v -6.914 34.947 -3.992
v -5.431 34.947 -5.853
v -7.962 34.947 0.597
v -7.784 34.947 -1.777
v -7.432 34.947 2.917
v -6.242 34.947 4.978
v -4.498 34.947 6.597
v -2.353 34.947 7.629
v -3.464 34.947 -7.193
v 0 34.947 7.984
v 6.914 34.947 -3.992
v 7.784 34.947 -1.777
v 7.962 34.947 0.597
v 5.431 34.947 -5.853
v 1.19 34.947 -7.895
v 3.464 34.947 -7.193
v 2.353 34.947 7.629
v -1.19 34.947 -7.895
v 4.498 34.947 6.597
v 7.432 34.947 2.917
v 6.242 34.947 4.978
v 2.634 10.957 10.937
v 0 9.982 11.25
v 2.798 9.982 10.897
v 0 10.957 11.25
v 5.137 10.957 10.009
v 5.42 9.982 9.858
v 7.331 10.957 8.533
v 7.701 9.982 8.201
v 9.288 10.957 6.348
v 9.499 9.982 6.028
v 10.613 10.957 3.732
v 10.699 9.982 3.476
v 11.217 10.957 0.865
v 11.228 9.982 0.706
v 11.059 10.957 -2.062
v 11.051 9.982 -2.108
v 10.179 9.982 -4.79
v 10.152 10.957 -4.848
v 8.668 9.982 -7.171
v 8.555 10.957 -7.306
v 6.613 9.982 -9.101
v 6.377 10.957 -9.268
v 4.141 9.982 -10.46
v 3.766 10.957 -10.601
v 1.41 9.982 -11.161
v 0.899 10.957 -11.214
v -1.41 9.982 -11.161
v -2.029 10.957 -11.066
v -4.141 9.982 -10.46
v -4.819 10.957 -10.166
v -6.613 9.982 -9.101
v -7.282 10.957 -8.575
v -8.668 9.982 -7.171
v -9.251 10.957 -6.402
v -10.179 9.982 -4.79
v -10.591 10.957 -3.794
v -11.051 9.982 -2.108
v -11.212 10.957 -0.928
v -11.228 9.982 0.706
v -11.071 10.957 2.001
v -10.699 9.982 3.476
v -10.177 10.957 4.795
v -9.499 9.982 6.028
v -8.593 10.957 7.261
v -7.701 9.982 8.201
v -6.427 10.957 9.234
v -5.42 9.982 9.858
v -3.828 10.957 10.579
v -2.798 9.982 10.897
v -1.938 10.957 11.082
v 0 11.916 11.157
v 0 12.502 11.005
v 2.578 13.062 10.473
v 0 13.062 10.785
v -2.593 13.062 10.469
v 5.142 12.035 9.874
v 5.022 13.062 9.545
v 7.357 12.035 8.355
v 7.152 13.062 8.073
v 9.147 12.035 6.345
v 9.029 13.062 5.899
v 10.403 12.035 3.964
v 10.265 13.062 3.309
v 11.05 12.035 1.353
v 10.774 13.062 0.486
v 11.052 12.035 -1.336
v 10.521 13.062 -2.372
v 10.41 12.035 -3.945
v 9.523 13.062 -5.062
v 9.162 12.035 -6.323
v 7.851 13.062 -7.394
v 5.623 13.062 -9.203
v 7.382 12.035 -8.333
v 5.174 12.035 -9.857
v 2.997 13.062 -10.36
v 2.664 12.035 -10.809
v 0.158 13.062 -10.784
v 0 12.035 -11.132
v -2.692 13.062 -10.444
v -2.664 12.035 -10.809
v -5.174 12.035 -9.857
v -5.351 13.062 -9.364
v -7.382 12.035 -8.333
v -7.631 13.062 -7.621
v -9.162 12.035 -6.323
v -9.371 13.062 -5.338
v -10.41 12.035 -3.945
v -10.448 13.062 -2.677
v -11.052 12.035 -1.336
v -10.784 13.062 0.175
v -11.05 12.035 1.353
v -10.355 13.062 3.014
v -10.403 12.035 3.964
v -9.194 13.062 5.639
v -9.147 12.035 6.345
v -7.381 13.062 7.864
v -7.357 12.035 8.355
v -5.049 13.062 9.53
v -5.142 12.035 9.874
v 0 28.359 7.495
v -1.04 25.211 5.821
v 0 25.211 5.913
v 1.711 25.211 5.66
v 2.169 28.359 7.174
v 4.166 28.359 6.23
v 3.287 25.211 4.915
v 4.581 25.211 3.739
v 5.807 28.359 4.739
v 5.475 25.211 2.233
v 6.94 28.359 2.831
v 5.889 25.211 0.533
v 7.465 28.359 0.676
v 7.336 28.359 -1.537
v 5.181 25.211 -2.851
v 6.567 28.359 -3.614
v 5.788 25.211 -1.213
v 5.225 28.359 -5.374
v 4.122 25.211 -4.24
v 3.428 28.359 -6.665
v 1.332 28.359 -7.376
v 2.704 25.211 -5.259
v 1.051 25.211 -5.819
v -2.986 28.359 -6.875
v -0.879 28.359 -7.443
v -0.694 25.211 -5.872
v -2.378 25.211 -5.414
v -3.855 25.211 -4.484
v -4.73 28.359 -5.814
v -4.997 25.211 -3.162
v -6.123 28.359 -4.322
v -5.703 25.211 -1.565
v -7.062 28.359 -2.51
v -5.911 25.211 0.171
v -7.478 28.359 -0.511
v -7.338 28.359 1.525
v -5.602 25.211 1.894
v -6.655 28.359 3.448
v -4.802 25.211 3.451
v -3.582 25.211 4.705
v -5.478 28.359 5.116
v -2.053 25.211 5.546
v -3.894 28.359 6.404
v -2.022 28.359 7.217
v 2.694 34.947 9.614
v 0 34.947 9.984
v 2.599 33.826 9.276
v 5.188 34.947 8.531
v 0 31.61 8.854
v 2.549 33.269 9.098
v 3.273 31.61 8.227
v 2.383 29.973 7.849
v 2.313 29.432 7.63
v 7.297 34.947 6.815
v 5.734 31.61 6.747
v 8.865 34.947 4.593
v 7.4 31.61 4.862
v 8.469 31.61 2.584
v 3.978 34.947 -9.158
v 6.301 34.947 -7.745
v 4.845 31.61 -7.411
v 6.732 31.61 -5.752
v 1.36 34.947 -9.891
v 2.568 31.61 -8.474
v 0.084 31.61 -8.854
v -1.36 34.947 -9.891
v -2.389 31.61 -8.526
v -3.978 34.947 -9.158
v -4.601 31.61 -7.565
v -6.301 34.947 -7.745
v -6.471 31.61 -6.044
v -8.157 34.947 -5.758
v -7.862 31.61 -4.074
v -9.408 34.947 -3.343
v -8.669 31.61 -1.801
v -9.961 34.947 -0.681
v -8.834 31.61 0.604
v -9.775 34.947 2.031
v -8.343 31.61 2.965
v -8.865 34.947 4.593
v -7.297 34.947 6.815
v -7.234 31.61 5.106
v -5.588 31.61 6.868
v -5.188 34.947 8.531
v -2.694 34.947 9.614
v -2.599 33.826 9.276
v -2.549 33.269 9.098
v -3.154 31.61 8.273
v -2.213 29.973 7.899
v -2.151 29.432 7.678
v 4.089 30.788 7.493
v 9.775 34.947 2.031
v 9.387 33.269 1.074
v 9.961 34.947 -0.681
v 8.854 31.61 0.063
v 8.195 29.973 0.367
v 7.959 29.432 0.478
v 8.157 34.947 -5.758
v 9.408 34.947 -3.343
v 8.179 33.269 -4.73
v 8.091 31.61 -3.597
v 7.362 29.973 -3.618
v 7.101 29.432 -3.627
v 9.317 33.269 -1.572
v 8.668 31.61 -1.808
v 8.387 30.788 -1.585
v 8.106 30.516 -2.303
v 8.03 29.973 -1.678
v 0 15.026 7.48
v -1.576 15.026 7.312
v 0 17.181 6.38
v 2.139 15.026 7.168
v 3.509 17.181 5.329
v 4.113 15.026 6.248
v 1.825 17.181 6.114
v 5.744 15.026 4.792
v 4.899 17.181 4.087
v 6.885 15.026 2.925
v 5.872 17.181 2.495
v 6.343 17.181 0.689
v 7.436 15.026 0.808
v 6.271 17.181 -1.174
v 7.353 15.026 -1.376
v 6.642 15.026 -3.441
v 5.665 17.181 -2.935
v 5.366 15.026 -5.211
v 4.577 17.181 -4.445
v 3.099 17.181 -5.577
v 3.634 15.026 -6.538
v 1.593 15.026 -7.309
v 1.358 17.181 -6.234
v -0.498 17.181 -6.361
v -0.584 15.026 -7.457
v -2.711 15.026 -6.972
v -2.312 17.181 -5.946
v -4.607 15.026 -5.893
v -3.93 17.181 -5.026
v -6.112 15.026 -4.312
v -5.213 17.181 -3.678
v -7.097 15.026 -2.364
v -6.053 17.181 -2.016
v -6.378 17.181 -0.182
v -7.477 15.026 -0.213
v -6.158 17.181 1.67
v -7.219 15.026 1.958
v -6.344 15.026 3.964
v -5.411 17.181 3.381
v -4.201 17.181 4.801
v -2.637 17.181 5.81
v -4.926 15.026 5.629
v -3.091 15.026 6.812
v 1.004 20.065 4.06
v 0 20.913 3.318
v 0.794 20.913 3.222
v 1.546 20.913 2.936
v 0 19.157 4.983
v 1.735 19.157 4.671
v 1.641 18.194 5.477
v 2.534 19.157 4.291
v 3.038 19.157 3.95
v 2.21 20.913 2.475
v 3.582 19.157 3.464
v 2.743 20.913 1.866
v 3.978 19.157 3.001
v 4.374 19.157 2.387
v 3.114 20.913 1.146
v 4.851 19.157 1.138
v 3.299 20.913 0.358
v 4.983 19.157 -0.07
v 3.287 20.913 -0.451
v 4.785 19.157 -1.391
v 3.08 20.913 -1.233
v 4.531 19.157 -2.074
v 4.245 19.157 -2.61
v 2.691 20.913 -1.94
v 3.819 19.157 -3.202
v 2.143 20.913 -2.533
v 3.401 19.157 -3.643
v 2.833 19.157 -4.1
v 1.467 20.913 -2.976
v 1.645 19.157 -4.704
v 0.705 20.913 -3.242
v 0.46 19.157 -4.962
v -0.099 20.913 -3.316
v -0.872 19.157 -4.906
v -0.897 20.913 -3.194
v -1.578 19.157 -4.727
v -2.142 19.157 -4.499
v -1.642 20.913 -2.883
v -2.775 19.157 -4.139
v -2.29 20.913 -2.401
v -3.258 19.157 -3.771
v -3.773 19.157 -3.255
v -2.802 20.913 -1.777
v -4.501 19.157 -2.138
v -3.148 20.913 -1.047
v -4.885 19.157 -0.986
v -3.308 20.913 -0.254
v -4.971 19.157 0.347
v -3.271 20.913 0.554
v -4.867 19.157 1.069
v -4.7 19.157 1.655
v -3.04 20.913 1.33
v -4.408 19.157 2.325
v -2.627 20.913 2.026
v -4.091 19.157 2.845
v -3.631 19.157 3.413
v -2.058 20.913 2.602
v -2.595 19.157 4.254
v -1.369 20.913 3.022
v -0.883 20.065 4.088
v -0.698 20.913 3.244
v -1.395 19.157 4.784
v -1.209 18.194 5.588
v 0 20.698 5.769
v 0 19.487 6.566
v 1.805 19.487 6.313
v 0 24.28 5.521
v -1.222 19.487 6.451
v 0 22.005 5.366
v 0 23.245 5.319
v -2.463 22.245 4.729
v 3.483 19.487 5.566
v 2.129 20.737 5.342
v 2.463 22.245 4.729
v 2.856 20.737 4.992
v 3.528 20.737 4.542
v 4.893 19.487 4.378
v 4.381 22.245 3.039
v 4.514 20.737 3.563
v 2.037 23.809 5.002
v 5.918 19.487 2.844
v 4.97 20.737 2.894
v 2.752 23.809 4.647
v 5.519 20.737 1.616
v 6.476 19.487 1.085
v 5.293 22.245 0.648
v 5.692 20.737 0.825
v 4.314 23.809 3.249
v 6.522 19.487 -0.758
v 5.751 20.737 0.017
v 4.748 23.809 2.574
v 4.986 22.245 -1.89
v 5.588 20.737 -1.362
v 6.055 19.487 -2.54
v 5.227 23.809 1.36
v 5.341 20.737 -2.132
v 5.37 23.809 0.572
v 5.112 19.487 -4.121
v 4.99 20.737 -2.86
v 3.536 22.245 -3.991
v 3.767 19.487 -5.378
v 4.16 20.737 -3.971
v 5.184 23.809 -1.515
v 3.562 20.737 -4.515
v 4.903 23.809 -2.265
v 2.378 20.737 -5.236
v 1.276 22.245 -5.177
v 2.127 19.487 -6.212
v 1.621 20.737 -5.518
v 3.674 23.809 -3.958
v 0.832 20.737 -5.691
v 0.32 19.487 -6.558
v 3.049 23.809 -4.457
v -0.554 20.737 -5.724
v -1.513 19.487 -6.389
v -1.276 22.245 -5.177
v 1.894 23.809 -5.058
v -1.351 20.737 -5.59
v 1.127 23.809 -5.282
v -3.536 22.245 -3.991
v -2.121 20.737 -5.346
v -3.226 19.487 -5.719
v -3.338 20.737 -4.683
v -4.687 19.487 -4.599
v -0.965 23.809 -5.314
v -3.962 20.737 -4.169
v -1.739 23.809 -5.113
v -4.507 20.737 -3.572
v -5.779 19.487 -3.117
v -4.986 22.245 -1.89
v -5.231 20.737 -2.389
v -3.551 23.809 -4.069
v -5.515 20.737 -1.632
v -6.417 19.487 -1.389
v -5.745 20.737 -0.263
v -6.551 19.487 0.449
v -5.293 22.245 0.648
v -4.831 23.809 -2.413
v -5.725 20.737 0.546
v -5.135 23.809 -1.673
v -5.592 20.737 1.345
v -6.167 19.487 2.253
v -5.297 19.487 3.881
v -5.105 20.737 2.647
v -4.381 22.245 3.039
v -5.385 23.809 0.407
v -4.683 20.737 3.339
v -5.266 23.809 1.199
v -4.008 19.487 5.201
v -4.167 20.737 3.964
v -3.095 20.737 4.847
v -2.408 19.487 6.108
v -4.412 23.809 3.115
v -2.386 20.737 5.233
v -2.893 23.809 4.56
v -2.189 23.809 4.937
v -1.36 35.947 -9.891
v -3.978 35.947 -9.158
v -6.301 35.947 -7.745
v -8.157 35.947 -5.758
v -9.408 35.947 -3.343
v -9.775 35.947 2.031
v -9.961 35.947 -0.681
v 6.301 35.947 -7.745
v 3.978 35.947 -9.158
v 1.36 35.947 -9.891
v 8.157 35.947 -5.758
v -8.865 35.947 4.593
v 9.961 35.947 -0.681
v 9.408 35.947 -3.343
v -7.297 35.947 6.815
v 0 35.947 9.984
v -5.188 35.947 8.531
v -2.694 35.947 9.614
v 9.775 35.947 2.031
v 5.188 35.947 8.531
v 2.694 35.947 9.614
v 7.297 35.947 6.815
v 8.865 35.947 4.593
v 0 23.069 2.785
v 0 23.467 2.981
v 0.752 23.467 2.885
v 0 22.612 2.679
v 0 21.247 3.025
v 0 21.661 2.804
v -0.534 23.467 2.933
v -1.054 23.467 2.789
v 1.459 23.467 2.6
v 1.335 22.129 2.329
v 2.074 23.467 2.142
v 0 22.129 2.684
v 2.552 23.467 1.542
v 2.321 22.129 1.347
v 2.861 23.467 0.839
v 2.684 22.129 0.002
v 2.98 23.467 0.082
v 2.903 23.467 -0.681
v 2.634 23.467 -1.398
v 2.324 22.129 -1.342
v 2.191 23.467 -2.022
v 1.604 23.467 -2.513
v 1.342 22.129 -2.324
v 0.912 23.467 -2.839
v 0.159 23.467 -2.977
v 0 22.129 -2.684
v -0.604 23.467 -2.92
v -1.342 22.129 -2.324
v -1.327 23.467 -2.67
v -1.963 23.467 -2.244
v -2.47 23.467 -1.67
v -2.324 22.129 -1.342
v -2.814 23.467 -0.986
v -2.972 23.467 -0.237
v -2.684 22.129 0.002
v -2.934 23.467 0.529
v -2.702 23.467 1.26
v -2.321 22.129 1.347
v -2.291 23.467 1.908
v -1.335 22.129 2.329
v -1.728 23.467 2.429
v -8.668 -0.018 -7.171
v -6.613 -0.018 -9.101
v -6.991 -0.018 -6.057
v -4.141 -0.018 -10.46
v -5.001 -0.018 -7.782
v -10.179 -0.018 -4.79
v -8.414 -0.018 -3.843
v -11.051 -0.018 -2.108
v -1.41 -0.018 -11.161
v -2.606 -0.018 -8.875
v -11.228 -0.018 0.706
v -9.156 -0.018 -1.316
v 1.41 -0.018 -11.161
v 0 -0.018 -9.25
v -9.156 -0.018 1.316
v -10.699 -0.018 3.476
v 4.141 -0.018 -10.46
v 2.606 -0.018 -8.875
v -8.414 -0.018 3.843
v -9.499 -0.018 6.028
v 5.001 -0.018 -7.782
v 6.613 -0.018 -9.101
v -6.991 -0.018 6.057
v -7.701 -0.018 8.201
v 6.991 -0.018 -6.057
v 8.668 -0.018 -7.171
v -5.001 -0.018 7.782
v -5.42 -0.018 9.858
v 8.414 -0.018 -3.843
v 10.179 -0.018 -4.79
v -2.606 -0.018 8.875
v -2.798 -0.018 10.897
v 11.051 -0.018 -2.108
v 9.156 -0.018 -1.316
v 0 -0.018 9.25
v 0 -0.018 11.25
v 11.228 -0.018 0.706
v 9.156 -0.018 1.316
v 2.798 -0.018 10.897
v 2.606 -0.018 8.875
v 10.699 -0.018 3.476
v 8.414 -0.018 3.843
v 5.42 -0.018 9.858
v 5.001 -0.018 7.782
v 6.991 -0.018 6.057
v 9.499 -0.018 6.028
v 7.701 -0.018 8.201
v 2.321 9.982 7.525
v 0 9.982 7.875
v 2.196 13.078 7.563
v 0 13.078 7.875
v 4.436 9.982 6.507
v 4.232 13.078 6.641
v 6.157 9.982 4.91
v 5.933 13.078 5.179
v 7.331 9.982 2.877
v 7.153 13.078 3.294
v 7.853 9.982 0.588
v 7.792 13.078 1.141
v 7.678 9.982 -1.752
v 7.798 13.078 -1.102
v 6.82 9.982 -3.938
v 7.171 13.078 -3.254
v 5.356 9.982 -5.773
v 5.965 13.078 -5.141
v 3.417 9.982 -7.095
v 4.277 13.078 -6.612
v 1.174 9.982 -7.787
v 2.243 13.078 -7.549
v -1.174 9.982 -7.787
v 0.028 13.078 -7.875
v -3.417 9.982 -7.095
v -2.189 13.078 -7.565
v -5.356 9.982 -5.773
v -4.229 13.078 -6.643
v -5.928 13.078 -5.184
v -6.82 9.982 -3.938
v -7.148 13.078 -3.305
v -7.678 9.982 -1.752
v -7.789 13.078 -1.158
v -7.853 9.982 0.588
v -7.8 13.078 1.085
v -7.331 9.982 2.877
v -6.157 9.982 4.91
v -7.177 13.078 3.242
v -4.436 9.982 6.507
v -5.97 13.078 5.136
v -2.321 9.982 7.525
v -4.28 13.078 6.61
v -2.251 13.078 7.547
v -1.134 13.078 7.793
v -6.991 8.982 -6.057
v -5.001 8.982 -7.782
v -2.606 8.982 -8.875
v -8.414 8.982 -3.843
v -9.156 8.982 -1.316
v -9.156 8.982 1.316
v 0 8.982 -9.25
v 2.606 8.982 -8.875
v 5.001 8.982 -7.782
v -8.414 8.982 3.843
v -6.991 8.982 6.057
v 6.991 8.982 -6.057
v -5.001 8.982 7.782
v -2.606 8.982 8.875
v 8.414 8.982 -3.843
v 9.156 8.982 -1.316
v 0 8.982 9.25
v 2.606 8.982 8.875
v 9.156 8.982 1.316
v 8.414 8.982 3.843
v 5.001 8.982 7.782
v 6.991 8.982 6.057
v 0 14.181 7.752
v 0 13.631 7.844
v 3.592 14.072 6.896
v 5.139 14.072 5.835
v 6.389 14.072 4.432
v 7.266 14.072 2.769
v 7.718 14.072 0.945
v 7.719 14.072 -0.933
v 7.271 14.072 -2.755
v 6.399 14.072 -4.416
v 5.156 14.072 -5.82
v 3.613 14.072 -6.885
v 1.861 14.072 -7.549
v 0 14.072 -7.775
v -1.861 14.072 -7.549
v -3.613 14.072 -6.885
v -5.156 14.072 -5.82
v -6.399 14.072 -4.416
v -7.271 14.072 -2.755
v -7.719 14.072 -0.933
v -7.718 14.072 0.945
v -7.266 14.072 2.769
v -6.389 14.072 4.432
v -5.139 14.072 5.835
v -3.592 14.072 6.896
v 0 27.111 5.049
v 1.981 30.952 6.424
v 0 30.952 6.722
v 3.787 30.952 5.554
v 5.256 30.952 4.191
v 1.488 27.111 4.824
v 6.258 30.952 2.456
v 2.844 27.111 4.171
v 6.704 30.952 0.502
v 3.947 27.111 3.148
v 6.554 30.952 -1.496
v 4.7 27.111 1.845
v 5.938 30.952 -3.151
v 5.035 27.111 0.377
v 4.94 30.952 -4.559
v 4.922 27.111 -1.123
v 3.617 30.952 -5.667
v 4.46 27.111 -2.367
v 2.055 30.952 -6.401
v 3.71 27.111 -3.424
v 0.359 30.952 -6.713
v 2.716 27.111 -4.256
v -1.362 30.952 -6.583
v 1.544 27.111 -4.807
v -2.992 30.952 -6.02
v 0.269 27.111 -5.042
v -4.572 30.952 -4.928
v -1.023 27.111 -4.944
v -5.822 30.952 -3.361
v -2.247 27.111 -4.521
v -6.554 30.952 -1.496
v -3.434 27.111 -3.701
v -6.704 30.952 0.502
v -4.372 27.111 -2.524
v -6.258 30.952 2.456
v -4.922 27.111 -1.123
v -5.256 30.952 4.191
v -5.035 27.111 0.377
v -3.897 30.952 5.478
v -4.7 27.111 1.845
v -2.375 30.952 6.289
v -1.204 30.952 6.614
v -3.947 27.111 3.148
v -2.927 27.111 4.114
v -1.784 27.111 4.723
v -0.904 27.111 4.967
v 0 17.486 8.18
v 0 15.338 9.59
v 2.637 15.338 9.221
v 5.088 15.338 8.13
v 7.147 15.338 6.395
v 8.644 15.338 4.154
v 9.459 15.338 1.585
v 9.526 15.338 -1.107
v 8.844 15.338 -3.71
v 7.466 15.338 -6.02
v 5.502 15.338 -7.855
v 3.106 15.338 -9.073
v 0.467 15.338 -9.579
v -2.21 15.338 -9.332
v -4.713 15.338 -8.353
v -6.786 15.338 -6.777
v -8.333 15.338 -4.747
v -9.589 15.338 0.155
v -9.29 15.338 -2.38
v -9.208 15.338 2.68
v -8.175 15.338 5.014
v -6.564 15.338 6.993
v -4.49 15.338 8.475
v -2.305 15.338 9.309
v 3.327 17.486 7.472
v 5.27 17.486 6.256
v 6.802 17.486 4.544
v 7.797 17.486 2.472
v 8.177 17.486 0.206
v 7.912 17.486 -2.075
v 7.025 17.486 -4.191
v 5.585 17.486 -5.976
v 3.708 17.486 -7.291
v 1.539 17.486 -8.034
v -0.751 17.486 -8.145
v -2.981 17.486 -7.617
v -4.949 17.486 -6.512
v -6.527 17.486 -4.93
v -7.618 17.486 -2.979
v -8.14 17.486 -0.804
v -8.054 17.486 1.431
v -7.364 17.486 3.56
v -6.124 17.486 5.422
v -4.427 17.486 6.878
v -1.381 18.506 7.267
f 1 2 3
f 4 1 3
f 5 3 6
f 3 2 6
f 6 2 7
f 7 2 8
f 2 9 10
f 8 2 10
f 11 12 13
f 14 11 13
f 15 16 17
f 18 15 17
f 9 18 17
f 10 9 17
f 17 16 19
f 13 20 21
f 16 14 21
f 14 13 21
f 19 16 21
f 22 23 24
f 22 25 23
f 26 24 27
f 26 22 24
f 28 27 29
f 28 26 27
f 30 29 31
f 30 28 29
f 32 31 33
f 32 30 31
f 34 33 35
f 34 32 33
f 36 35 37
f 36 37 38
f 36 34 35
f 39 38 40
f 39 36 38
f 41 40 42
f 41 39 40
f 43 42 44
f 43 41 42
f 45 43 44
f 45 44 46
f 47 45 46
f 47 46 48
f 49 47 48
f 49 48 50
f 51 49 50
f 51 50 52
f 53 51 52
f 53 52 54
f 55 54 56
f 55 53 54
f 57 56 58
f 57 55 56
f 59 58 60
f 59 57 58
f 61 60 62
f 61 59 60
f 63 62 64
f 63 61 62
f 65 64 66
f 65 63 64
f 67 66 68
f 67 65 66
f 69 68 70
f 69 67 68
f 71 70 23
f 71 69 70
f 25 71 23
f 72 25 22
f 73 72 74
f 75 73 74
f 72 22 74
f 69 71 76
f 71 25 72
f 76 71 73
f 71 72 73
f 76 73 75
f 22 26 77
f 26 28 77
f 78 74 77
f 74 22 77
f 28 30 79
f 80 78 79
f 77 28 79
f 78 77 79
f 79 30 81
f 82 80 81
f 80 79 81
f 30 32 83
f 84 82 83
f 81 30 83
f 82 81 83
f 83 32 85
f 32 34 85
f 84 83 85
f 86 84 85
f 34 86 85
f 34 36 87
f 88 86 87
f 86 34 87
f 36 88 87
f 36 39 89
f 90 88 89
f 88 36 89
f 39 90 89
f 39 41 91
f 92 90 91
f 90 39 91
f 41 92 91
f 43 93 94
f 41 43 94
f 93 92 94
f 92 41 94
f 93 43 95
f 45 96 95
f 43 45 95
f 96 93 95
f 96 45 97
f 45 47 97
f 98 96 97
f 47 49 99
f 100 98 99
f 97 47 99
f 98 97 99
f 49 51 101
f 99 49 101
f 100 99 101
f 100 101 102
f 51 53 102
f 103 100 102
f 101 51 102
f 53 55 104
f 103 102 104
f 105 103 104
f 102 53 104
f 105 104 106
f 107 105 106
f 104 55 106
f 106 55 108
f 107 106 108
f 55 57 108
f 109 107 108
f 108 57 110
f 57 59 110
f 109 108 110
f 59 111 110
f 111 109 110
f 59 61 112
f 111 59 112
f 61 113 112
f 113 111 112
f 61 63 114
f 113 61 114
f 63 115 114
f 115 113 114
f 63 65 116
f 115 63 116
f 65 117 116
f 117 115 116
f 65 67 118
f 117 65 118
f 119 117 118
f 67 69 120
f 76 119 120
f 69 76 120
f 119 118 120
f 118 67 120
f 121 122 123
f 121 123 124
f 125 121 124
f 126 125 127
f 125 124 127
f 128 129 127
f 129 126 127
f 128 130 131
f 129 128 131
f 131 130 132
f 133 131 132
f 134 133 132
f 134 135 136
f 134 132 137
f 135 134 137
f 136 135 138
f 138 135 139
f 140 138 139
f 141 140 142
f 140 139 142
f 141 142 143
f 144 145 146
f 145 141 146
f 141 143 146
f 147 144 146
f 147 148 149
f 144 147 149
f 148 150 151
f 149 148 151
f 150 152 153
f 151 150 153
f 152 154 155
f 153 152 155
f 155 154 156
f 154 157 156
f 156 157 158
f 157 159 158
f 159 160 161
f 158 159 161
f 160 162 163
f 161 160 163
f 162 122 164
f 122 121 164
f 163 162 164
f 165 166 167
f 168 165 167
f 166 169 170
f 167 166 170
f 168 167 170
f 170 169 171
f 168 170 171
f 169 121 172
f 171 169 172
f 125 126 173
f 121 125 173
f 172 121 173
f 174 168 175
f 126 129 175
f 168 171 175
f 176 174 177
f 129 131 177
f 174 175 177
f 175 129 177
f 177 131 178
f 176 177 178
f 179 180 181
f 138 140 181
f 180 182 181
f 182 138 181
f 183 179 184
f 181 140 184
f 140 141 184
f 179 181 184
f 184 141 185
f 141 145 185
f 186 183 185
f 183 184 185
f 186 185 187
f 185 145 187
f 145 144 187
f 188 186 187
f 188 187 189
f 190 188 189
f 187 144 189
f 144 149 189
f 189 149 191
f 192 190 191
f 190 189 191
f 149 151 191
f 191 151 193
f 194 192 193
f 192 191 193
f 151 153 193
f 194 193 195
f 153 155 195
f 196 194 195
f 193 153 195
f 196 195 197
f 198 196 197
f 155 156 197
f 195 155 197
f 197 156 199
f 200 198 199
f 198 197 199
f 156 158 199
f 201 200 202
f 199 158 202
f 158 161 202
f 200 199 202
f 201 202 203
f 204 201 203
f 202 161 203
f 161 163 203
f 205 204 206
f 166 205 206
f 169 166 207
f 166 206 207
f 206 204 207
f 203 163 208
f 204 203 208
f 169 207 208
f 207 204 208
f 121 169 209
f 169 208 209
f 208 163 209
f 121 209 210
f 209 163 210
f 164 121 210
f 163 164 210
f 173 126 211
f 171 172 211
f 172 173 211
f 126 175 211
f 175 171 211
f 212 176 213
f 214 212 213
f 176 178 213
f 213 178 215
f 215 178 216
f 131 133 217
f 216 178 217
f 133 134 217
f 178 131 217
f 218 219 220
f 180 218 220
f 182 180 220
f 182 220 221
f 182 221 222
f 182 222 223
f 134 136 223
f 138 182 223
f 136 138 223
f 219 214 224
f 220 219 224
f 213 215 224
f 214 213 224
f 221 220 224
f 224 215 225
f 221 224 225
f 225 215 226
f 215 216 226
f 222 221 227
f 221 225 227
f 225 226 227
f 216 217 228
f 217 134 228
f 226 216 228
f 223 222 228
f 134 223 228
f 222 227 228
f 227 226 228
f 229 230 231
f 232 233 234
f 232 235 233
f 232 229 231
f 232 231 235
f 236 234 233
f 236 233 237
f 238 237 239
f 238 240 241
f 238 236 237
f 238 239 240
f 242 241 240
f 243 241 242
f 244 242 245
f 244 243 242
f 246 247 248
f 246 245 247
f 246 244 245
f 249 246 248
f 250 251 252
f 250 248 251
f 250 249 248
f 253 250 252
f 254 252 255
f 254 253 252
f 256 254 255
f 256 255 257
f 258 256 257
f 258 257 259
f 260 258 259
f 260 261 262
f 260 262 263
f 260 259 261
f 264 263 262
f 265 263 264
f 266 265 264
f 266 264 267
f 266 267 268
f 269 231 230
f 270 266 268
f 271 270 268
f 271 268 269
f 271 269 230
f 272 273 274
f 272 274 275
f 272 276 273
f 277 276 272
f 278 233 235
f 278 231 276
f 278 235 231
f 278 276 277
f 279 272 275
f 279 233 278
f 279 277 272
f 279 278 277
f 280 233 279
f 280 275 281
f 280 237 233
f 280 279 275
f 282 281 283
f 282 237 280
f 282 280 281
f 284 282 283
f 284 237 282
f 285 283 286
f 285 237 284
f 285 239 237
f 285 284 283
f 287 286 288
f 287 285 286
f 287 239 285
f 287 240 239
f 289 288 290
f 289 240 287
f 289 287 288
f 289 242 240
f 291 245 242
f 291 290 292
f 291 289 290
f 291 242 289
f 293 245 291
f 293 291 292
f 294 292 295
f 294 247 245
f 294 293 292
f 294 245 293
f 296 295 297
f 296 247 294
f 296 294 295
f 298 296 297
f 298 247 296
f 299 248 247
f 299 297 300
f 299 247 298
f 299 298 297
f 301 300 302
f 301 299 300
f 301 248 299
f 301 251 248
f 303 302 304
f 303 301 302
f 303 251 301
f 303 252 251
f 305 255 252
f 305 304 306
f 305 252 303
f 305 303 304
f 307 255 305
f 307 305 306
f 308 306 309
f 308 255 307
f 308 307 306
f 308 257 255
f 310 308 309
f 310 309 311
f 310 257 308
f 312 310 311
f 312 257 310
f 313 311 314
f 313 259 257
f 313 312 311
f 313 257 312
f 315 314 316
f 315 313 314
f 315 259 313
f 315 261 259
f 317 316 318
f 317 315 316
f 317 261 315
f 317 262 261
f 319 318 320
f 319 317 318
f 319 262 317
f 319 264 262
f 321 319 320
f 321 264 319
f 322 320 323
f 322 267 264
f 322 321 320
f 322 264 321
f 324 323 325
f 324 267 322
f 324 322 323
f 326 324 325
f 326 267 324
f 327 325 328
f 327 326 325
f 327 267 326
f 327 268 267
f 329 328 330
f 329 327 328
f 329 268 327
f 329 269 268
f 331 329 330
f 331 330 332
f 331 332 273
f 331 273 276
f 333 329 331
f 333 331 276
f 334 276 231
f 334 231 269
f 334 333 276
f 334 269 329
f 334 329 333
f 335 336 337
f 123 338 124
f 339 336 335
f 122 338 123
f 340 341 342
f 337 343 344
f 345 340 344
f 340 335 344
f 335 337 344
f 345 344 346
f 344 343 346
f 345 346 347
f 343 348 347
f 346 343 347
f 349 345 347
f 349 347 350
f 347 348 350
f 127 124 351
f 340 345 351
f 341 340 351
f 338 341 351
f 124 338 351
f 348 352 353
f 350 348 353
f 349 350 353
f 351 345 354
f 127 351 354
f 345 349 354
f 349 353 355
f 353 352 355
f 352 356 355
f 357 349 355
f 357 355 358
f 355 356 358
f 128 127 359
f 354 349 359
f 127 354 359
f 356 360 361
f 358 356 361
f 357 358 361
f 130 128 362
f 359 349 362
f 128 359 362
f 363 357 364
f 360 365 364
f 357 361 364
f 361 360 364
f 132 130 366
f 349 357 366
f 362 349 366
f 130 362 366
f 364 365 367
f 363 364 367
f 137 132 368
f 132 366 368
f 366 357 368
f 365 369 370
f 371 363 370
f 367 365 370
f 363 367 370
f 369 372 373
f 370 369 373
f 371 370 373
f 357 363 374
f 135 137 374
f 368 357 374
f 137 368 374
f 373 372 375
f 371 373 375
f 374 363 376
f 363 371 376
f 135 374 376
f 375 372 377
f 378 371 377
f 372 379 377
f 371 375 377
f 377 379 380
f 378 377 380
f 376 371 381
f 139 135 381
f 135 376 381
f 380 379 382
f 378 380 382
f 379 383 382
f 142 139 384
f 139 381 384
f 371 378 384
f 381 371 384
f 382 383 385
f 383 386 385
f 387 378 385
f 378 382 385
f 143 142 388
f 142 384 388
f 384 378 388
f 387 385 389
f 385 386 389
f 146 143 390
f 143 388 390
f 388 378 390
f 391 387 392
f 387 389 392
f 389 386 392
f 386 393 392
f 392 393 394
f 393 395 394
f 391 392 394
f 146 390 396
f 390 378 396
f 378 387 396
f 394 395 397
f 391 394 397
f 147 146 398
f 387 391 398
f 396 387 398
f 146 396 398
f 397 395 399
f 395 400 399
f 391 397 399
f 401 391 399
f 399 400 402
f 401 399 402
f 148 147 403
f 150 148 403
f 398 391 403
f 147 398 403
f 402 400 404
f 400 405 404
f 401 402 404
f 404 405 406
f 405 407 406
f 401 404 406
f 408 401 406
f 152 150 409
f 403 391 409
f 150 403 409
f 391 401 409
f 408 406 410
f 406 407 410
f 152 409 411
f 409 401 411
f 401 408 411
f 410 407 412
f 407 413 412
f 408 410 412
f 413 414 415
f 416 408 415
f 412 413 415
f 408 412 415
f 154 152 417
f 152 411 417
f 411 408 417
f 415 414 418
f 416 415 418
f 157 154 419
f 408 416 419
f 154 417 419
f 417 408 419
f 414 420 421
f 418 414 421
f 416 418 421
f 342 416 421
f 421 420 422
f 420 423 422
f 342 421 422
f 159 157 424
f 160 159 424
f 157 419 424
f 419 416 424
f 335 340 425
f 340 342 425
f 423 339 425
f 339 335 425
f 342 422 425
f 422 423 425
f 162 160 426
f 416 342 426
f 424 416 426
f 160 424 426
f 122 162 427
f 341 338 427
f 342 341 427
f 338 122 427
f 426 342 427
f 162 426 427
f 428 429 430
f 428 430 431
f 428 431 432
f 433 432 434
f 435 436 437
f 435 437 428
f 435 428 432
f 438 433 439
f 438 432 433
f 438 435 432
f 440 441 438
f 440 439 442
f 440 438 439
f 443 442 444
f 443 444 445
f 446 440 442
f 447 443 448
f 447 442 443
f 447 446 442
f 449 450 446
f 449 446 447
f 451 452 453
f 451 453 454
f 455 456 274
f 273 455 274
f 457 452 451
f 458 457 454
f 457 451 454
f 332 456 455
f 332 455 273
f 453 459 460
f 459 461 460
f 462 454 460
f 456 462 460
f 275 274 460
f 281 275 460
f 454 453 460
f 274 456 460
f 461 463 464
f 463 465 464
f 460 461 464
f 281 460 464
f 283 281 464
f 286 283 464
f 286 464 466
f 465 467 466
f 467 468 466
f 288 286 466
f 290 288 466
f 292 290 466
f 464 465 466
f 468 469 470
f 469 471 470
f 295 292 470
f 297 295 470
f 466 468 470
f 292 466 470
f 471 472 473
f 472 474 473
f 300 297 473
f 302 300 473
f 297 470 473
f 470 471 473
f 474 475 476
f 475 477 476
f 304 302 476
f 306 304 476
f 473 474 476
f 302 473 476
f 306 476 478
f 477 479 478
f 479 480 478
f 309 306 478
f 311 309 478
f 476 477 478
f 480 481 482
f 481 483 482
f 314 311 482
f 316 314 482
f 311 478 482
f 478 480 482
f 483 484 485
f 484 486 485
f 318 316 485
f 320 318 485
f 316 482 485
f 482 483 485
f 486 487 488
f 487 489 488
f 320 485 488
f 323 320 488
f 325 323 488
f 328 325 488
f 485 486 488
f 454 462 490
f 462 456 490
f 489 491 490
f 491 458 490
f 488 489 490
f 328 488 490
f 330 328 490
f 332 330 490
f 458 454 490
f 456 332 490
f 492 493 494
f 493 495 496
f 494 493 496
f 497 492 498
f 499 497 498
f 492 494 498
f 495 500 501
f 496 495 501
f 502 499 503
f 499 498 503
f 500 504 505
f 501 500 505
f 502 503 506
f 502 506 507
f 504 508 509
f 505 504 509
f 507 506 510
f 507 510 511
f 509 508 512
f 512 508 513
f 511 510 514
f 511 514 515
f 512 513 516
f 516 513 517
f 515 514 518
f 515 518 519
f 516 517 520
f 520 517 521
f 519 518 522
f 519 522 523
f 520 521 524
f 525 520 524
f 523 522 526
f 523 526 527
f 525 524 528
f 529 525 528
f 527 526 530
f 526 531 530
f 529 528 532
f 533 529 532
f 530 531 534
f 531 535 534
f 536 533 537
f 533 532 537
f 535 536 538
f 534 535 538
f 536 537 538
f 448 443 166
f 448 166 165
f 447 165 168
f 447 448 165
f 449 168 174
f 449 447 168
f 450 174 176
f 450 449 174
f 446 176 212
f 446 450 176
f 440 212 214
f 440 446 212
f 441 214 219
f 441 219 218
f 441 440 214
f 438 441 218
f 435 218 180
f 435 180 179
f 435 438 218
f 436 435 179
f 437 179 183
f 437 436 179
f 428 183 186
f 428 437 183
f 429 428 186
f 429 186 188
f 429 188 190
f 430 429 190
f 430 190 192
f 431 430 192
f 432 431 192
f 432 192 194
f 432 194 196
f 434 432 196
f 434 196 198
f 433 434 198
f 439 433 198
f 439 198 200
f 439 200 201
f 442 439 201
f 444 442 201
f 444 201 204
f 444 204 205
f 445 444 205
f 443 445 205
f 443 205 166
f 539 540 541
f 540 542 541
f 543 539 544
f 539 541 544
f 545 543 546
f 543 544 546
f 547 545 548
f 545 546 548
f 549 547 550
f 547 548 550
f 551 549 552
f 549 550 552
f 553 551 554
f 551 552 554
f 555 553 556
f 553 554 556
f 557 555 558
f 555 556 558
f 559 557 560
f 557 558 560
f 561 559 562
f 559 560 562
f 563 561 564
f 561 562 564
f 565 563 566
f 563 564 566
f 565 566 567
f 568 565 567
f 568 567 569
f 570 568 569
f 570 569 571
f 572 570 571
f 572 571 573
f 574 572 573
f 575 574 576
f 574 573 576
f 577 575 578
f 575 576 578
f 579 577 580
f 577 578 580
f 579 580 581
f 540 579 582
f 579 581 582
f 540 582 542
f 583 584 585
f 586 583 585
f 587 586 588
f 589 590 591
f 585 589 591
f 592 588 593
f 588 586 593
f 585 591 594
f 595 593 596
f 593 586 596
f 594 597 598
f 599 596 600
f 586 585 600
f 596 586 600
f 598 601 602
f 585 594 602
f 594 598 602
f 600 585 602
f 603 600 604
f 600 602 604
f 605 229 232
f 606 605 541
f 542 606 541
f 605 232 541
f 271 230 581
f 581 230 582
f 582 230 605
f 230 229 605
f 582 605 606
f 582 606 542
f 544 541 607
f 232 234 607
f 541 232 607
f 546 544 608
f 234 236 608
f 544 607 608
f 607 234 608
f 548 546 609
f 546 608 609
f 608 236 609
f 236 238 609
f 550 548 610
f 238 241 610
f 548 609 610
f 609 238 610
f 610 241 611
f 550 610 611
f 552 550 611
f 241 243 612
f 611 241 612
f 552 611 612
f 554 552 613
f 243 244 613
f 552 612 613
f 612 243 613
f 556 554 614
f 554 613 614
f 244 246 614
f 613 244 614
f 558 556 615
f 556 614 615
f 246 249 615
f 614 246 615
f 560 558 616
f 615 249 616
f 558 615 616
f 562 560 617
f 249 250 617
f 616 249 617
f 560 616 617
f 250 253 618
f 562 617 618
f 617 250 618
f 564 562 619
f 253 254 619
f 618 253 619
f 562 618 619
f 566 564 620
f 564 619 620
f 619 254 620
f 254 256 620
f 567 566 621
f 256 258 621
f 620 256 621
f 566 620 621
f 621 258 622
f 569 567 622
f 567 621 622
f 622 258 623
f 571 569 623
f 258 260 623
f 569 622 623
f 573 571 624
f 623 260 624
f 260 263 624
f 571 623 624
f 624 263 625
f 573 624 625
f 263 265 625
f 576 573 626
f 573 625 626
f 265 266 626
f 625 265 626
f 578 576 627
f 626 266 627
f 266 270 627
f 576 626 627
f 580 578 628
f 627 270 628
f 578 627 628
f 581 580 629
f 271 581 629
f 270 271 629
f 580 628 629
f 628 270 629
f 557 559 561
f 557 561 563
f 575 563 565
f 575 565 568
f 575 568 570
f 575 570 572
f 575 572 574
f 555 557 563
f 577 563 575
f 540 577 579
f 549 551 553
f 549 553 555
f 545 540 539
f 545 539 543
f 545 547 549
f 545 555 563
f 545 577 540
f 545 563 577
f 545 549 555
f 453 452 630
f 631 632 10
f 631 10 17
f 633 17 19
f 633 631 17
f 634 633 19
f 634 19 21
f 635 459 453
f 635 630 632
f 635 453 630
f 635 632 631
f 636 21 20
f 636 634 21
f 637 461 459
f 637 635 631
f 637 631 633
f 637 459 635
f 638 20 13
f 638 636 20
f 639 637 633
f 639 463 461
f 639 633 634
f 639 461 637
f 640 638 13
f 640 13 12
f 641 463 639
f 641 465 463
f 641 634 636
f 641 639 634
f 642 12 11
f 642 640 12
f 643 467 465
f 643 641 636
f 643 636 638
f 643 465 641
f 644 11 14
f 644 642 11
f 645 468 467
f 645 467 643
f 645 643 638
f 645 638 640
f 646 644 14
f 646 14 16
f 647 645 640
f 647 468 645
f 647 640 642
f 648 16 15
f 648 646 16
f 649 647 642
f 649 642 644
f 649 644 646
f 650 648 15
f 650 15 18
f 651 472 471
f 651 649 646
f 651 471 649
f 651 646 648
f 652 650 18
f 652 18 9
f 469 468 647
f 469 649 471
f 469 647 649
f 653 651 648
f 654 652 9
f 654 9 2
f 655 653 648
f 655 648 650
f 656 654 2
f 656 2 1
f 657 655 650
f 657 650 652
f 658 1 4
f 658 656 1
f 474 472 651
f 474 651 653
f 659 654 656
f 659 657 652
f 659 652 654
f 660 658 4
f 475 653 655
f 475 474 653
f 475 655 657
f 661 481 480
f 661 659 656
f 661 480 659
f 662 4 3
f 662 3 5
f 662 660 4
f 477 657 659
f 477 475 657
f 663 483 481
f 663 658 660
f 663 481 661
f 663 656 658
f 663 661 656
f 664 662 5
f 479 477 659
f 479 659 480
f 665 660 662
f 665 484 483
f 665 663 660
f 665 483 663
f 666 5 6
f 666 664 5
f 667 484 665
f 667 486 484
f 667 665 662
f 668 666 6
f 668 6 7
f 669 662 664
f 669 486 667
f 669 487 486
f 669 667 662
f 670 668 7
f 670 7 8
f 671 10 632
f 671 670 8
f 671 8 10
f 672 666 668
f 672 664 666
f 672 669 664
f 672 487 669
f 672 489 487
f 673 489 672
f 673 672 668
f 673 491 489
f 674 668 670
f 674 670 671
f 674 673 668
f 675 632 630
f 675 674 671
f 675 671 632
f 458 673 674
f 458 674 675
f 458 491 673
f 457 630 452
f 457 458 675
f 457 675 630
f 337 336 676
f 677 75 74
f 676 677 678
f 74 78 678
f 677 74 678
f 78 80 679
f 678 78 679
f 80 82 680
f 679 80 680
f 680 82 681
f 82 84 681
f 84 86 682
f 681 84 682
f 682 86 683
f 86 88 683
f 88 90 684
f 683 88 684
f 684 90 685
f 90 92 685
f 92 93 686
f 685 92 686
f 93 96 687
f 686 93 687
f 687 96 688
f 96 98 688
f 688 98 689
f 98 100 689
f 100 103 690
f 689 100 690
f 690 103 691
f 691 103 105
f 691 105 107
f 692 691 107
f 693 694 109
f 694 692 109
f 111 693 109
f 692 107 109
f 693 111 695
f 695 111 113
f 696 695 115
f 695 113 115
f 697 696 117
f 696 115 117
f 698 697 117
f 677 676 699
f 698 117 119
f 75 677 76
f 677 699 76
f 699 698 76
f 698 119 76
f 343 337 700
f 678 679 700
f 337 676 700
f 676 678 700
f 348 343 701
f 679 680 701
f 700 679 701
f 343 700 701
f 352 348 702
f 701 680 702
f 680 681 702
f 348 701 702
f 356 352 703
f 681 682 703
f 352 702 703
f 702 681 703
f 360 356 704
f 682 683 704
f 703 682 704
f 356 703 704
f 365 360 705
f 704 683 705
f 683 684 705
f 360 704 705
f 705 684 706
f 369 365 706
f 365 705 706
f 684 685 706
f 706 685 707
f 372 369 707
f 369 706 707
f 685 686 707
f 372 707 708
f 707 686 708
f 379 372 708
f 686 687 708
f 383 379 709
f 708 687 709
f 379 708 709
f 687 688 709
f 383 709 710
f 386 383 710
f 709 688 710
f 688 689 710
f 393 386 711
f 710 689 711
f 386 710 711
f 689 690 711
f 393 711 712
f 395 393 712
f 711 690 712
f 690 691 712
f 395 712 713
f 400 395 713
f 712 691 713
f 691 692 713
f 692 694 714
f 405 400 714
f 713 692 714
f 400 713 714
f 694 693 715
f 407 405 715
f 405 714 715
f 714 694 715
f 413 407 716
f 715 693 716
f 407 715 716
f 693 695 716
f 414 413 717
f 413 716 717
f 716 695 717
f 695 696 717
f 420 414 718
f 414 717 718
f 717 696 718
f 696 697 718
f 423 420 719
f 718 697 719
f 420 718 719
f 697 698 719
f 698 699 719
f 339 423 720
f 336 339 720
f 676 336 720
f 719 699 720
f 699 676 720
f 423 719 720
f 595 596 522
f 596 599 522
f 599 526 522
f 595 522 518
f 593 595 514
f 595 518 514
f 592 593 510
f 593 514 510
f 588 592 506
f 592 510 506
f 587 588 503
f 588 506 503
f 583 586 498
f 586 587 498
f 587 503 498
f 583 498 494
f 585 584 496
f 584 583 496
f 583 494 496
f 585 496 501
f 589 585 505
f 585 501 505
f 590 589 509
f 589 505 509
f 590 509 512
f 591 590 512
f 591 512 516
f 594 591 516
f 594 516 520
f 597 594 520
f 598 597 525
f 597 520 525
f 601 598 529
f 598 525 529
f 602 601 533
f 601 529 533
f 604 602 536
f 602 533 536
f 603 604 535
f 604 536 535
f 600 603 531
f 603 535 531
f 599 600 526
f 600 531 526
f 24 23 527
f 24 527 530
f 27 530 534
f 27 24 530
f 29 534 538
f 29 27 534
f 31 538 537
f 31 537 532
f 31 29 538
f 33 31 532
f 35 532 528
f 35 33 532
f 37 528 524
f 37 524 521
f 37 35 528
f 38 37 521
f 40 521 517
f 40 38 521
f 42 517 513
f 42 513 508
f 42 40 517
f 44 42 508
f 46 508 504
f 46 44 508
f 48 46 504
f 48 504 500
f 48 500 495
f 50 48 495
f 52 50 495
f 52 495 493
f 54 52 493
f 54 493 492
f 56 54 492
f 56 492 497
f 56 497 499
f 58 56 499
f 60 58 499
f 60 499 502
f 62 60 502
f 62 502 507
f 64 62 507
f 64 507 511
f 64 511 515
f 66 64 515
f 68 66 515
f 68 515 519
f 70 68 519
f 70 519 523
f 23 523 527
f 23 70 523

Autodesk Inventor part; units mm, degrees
ref_plane "YZ Plane" through (0, 0, 0) normal (1, 0, 0) x (0, 1, 0)
ref_plane "XZ Plane" through (0, 0, 0) normal (0, 1, 0) x (-1, 0, 0)
ref_plane "XY Plane" through (0, 0, 0) normal (0, 0, 1) x (1, 0, 0)
sketch "Sketch1" plane through (0, 0, 0) normal (1, 0, 0) x (0, 1, 0)
  line L0 (9.25, 0.0185) -> (11.25, 0.0185)
  line L1 (11.25, 0.0185) -> (11.25, -9.9815)
  line L2 (11.25, -9.9815) -> (11.25, -12)
  arc A0 (1.9984, -22.0011) -> (7.875, -14) centre (-8.063, -8.4526) ccw
  arc A1 (7.9841, -34.947) -> (1.9984, -22.0011) centre (-30.628, -44.9433) ccw
  arc A2 (4, -22) -> (11.25, -12) centre (-13.1002, -1.9743) ccw
  arc A3 (9.9841, -34.947) -> (4, -22) centre (-38.5, -49.5) ccw
  line L3 (7.875, -9.9815) -> (7.875, -14)
  line L4 (0, 0) -> (0, -36)
  line L5 (7.9841, -34.947) -> (0, -34.947)
  line L6 (0, -34.947) -> (0, -35.947)
  line L7 (9.9841, -34.947) -> (9.9841, -35.947)
  line L8 (9.9841, -35.947) -> (0, -35.947)
  line L9 (7.875, -9.9815) -> (0, -9.9815)
  line L10 (0, -9.9815) -> (0, -8.9815)
  line L11 (0, -8.9815) -> (9.25, -8.9815)
  line L12 (9.25, -8.9815) -> (9.25, 0.0185)
  dimension "d26" = 9.25
  dimension "d28" = 2
  dimension "d37" = 34.9656
  dimension "d57" = 36
  dimension "d59" = 1
  dimension "d60" = 1
  dimension "d61" = 90
revolve "Revolution1" add sketch "Sketch1" angle 360 about axis through (0, 0, 0) along (0, 0, -1) contours L0 L1 L2 A2 A3 L7 L8 L4 L5 A1 A0 L3 L9 L11 L12
move or copy body "Move Body1" bodies to move or copy 1 copy no rotation origin (0, 0, 0) rotation axis (1, 0, 0) rotation angle 90
fillet "Fillet6" radius 2 1 edges at (0, 22.0011, -1.9984)
fillet "Fillet7" radius 5 1 edges at (0, 14, -7.875)
fillet "Fillet8" radius 5 1 edges at (0, 12, -11.25)
fillet "Fillet9" radius 5 1 edges at (0, 22, -4)
properties part number "nozzle-cfd" material "ABS Plastic"
